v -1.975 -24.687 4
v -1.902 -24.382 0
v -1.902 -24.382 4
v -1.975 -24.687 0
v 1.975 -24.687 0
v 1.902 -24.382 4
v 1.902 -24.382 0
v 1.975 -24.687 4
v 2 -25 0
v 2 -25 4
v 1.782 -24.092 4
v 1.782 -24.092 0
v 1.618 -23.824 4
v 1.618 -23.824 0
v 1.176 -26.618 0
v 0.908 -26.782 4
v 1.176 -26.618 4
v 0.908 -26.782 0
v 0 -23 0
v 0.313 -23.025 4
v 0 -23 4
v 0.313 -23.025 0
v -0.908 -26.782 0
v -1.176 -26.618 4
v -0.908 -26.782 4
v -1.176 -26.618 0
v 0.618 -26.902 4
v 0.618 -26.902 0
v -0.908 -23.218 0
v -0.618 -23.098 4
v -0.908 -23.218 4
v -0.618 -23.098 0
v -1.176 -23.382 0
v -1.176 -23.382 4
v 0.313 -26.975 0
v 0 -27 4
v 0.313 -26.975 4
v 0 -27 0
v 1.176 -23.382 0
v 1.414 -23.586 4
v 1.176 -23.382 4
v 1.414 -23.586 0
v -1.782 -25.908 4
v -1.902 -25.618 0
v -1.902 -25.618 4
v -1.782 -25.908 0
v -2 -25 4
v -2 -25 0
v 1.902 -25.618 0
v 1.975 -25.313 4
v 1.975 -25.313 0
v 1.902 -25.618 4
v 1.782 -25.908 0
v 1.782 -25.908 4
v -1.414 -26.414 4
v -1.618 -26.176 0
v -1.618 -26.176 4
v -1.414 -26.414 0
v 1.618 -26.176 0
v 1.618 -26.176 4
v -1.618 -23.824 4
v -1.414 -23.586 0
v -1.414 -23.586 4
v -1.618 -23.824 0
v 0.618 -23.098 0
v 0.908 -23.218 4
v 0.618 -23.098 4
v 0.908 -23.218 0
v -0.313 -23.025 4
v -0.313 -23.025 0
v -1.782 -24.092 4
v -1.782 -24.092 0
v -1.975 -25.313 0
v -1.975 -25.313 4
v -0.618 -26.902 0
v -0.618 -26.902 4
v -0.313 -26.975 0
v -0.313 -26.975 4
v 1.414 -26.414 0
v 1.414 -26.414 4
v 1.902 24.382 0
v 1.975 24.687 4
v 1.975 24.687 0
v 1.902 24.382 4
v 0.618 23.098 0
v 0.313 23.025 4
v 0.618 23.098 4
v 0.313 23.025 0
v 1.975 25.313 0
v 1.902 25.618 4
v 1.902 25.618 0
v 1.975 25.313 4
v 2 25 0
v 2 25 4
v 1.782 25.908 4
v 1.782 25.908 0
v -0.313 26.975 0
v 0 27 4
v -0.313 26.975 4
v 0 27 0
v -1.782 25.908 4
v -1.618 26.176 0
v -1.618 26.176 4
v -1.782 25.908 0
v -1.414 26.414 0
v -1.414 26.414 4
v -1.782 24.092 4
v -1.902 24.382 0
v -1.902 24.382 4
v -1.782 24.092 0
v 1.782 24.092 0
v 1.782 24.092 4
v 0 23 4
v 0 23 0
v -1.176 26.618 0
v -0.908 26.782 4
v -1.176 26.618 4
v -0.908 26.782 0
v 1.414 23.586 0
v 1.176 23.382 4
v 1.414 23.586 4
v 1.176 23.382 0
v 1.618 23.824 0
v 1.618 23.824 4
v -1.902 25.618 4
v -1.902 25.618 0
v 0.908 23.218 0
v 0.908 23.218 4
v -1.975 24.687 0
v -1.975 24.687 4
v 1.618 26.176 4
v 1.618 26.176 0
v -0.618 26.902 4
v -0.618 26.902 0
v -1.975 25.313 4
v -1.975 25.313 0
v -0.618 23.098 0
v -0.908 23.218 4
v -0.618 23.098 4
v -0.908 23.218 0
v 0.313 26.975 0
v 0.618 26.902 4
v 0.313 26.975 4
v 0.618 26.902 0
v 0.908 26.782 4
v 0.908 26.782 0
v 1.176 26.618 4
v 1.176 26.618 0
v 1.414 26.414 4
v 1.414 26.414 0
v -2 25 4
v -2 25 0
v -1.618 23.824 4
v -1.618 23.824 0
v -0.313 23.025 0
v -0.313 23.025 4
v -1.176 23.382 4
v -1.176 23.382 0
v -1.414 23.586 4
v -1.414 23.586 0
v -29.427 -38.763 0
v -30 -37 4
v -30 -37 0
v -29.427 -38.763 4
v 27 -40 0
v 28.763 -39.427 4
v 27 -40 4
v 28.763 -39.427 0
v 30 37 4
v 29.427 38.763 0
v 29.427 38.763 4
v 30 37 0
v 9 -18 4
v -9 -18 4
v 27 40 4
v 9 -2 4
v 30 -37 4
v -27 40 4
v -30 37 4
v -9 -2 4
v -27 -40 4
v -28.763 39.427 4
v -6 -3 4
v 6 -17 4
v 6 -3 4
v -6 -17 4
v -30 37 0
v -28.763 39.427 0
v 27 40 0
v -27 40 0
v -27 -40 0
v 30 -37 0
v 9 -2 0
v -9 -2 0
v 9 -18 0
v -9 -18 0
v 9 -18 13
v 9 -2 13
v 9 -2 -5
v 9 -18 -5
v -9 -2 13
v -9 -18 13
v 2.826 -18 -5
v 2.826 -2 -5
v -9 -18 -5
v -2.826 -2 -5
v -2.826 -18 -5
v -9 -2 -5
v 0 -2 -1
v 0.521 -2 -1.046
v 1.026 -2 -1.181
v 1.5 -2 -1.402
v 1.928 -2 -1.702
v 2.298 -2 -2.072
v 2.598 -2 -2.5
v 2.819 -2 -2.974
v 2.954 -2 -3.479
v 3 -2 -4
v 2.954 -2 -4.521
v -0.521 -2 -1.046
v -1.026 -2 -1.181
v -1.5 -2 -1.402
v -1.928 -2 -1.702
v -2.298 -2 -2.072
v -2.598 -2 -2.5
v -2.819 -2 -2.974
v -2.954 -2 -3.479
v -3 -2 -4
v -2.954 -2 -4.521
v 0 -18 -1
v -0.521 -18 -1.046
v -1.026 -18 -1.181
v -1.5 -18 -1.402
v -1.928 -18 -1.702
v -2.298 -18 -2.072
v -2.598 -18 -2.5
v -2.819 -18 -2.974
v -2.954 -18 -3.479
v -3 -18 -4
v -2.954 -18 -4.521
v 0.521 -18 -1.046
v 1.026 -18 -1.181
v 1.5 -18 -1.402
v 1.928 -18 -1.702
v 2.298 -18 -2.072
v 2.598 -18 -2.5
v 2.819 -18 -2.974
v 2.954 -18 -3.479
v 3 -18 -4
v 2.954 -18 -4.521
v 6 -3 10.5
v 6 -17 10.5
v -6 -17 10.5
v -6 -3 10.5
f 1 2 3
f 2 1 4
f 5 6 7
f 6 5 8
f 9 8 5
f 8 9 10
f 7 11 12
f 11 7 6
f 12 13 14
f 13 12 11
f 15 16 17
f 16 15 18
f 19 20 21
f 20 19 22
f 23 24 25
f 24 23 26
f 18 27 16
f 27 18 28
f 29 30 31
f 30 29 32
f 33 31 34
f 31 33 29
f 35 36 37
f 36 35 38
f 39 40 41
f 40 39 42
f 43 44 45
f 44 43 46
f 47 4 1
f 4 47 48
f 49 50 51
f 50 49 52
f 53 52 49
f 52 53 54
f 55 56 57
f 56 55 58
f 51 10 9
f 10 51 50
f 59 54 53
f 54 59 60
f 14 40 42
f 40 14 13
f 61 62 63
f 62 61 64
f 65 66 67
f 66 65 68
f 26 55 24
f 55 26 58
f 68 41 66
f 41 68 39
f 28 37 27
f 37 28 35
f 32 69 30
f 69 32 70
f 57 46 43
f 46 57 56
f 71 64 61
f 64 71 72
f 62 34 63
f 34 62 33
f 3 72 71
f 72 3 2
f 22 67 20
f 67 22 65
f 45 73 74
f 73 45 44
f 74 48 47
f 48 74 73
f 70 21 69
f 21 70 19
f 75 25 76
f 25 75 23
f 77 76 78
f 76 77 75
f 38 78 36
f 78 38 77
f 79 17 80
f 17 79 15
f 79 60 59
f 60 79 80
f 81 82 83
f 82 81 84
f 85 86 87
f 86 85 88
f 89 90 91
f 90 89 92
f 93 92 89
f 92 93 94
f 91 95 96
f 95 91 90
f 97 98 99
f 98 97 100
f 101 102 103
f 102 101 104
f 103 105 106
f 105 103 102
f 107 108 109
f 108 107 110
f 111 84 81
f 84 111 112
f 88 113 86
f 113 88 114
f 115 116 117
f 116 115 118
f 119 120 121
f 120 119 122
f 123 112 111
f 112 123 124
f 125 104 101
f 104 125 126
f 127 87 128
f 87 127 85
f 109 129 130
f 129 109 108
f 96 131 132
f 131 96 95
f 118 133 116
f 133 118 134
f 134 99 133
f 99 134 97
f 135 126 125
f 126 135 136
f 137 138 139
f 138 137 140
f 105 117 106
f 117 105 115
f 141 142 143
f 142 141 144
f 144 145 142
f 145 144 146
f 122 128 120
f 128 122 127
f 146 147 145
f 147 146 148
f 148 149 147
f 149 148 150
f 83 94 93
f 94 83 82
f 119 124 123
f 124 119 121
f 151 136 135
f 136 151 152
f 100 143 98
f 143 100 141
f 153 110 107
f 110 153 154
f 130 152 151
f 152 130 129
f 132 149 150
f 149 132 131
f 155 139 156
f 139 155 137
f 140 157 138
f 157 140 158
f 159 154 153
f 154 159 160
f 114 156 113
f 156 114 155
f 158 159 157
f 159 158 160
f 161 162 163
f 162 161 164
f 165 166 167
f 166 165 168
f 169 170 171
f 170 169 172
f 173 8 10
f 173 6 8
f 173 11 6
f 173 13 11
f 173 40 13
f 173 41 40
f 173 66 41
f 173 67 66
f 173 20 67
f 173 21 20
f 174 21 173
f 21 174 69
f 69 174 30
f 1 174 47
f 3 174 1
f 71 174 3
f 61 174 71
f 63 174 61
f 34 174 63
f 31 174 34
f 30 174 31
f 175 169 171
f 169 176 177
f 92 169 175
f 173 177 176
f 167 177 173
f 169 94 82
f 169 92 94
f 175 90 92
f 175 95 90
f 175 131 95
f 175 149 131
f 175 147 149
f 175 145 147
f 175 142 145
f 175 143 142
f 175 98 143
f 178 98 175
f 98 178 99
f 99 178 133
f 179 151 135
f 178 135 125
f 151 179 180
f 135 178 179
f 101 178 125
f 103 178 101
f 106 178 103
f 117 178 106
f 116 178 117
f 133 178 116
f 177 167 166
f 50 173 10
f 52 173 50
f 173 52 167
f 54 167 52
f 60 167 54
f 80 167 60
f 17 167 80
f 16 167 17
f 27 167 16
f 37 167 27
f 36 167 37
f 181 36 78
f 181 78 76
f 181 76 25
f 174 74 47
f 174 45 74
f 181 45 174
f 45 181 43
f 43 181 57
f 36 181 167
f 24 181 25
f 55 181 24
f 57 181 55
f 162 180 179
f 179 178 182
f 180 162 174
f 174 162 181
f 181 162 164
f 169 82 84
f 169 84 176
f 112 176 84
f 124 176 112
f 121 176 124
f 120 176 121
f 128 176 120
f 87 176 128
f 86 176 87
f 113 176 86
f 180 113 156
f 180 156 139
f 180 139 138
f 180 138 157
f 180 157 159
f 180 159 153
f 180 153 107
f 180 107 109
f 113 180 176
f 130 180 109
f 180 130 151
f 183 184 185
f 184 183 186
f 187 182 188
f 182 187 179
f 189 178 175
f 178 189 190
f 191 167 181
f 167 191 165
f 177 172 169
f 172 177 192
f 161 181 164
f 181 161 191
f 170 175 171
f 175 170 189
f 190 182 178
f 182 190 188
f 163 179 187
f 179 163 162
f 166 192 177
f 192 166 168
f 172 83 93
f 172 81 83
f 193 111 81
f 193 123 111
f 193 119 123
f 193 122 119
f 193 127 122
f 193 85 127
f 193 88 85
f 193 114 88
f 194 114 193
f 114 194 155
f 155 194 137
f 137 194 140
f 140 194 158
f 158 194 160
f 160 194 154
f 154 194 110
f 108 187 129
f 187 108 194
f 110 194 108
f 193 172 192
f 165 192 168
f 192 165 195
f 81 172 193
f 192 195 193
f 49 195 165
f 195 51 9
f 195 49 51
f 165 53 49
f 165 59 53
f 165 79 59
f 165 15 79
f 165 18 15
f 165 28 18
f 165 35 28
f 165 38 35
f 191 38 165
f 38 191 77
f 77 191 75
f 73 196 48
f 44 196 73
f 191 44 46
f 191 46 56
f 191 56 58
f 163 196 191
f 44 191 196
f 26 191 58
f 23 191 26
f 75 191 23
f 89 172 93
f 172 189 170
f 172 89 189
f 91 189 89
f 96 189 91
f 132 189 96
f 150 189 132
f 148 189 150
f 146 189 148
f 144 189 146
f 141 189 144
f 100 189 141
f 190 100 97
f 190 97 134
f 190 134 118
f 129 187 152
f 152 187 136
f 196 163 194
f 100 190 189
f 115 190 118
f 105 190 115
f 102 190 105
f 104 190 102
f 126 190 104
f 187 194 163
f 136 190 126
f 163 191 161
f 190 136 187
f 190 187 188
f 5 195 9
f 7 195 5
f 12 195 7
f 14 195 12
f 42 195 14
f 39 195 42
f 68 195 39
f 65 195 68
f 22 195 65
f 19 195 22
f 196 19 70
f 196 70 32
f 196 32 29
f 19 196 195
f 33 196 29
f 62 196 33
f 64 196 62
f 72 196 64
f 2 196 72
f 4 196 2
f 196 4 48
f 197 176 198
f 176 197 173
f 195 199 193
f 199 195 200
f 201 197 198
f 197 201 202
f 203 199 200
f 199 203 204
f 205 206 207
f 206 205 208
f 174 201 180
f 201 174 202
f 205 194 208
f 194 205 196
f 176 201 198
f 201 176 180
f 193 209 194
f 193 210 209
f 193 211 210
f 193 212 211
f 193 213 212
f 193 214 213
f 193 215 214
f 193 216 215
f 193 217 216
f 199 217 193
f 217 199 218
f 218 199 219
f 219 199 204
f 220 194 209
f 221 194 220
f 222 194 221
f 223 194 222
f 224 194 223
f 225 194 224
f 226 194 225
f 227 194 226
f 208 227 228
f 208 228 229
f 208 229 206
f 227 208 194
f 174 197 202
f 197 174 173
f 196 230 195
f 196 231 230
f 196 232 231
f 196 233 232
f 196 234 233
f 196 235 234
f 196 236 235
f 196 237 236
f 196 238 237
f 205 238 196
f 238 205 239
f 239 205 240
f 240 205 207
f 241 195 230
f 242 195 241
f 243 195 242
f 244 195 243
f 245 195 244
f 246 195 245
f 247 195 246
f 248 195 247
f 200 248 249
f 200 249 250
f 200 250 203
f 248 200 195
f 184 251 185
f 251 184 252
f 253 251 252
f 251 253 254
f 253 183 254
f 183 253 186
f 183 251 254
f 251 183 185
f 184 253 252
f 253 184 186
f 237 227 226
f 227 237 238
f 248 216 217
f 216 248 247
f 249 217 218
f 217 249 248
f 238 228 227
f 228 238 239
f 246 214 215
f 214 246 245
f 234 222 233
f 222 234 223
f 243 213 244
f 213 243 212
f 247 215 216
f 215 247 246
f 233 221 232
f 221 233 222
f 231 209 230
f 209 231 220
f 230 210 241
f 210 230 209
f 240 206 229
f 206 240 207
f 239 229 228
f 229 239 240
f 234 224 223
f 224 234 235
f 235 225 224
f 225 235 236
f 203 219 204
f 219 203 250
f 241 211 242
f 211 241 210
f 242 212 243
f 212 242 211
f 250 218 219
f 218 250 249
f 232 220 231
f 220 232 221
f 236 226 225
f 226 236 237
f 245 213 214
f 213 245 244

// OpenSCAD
// hook_sensor_mount.scad — parametric backplate + sensor pocket
// Units: mm

// --- Params ---
plate_w = 60;
plate_h = 80;
plate_t = 4;

standoff_dx = 0;      // lateral offset from plate center to hook line
standoff_dy = -10;    // vertical offset; negative = above midline
standoff_len = 18;    // how far sensor pocket protrudes
standoff_w = 18;
standoff_h = 16;

sensor_slot_w = 12;   // for small PCB hall modules; widen as needed
sensor_slot_h = 14;
sensor_slot_t = 6;    // slot depth

wire_ch = 6;          // wire channel diameter
hook_center_z = 0;    // reference plane for your hook

// screw holes
hole_d = 4;
hole_y_spacing = 50;

module rounded_plate(w, h, t, r=3) {
  linear_extrude(height=t)
    offset(r=r)
      square([w-2*r,h-2*r], center=true);
}

module mount() {
  // Backplate
  difference() {
    translate([0,0,0]) rounded_plate(plate_w, plate_h, plate_t, 3);
    // screw holes
    for (y=[-hole_y_spacing/2, hole_y_spacing/2])
      translate([0,y,-1]) cylinder(d=hole_d, h=plate_t+2, $fn=40);
  }

  // Standoff block
  translate([standoff_dx, standoff_dy, plate_t])
    difference() {
      cube([standoff_w, standoff_h, standoff_len], center=true);
      // sensor slot from front
      translate([0,0, (standoff_len/2) - sensor_slot_t])
        cube([sensor_slot_w, sensor_slot_h, sensor_slot_t+1], center=true);
      // wire channel from back
      translate([0, 0, -(standoff_len/2)+1])
        rotate([90,0,0]) cylinder(d=wire_ch, h=standoff_h+2, center=true, $fn=36);
    }
}

mount();
